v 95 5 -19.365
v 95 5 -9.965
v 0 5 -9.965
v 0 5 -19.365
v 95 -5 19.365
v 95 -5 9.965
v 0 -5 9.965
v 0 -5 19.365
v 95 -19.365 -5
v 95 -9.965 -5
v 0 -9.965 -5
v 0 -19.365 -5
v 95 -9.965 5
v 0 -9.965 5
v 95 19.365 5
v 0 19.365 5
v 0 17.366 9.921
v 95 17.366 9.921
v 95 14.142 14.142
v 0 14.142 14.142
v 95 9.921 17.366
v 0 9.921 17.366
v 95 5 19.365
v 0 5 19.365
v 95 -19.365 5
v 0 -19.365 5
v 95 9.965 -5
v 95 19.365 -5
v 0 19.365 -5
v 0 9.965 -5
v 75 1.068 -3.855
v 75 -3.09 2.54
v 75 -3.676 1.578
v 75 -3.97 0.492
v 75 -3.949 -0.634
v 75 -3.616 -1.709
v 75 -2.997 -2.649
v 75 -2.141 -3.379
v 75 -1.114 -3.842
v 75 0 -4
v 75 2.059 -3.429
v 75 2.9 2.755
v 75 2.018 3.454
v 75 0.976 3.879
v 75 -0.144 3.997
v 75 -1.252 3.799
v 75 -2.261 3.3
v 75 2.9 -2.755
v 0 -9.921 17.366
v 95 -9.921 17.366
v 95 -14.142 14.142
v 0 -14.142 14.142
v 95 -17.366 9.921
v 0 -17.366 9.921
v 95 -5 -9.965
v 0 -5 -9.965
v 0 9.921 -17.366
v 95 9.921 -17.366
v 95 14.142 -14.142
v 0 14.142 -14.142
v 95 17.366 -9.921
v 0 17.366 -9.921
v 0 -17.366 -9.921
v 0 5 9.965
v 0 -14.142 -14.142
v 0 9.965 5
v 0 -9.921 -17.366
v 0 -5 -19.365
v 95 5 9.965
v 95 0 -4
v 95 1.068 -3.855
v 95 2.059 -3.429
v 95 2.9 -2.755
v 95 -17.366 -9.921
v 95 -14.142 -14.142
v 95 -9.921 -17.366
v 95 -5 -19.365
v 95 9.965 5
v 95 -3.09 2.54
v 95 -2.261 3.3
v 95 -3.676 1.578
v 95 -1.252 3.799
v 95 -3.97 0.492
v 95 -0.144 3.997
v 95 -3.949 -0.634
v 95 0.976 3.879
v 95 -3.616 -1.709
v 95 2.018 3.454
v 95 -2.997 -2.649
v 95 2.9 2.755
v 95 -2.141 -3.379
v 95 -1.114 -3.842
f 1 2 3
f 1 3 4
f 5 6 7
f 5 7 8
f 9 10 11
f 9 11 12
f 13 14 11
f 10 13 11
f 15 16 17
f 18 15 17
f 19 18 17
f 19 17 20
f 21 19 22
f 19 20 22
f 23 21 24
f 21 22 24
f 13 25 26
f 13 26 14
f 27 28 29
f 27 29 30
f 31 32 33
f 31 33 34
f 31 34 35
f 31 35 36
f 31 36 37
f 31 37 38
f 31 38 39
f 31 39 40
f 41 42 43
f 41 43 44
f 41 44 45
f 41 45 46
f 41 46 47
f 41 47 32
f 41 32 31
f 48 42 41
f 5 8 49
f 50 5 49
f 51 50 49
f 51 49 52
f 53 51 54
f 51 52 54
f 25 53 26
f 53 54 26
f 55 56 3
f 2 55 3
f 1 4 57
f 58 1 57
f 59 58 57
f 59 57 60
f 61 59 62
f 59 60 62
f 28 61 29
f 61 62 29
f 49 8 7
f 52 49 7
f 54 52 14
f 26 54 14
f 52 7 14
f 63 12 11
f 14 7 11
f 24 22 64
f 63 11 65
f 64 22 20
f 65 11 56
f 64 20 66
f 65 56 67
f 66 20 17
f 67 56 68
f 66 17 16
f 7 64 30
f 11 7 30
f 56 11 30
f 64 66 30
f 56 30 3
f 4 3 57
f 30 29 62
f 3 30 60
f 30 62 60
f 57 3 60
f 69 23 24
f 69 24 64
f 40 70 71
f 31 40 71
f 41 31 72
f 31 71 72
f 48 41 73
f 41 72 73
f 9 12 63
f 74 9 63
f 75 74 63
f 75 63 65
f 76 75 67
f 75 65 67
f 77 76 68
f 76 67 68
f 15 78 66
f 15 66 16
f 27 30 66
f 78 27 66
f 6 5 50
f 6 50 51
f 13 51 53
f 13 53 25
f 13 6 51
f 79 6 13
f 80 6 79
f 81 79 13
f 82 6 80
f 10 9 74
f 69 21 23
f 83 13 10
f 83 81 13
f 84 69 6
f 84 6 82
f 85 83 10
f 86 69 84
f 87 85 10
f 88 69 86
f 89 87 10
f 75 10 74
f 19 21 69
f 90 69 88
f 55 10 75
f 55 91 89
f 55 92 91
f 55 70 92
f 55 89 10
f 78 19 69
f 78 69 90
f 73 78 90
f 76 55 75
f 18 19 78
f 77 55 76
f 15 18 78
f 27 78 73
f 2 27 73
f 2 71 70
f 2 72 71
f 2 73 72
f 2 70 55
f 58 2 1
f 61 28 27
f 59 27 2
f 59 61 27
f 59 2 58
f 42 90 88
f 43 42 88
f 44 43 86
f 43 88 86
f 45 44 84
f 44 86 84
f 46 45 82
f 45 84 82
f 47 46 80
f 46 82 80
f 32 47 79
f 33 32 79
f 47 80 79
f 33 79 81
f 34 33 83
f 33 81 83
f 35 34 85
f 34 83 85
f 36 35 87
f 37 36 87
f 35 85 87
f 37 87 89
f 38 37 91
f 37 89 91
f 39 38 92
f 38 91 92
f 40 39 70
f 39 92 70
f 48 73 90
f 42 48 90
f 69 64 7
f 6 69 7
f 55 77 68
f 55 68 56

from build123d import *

# Parameters (mm, degrees)
EXTRUDED_CONNECTOR_DEPTH = 95
KEY_CUT_DEPTH            = 20


with BuildPart() as part:
    # Sketch1 → Extruded Connector (new body)
    with BuildSketch(Plane(origin=(0, 0, 0), x_dir=(0, 0, -1), z_dir=(1, 0, 0))):
        with BuildLine():
            ThreePointArc((-19.364916731, -5), (-14.142135624, -14.142135624), (-5, -19.364916731))
            Line((-5, -19.364916731), (-5, -9.964916731))
            Line((-5, -9.964916731), (5, -9.964916731))
            Line((5, -9.964916731), (5, -19.364916731))
            ThreePointArc((5, -19.364916731), (14.142135624, -14.142135624), (19.364916731, -5))
            Line((19.364916731, -5), (9.964916731, -5))
            Line((9.964916731, -5), (9.964916731, 5))
            Line((9.964916731, 5), (19.364916731, 5))
            ThreePointArc((19.364916731, 5), (14.142135624, 14.142135624), (5, 19.364916731))
            Line((5, 19.364916731), (5, 9.964916731))
            Line((5, 9.964916731), (-5, 9.964916731))
            Line((-5, 9.964916731), (-5, 19.364916731))
            ThreePointArc((-5, 19.364916731), (-14.142135624, 14.142135624), (-19.364916731, 5))
            Line((-19.364916731, 5), (-9.964916731, 5))
            Line((-9.964916731, 5), (-9.964916731, -5))
            Line((-9.964916731, -5), (-19.364916731, -5))
        make_face()
    extrude(amount=EXTRUDED_CONNECTOR_DEPTH)

    # Sketch2 → Key Cut (cut)
    with BuildSketch(Plane(origin=(95, 0, 0), x_dir=(0, 0, -1), z_dir=(1, 0, 0))):
        with BuildLine():
            Line((2.754995463, 2.9), (-2.754995463, 2.9))
            ThreePointArc((-2.754995463, 2.9), (-1.577976259, -3.675593955), (4, 0))
            ThreePointArc((4, 0), (3.675593955, 1.577976259), (2.754995463, 2.9))
        make_face()
    extrude(amount=-KEY_CUT_DEPTH, mode=Mode.SUBTRACT)


solid = part.part
